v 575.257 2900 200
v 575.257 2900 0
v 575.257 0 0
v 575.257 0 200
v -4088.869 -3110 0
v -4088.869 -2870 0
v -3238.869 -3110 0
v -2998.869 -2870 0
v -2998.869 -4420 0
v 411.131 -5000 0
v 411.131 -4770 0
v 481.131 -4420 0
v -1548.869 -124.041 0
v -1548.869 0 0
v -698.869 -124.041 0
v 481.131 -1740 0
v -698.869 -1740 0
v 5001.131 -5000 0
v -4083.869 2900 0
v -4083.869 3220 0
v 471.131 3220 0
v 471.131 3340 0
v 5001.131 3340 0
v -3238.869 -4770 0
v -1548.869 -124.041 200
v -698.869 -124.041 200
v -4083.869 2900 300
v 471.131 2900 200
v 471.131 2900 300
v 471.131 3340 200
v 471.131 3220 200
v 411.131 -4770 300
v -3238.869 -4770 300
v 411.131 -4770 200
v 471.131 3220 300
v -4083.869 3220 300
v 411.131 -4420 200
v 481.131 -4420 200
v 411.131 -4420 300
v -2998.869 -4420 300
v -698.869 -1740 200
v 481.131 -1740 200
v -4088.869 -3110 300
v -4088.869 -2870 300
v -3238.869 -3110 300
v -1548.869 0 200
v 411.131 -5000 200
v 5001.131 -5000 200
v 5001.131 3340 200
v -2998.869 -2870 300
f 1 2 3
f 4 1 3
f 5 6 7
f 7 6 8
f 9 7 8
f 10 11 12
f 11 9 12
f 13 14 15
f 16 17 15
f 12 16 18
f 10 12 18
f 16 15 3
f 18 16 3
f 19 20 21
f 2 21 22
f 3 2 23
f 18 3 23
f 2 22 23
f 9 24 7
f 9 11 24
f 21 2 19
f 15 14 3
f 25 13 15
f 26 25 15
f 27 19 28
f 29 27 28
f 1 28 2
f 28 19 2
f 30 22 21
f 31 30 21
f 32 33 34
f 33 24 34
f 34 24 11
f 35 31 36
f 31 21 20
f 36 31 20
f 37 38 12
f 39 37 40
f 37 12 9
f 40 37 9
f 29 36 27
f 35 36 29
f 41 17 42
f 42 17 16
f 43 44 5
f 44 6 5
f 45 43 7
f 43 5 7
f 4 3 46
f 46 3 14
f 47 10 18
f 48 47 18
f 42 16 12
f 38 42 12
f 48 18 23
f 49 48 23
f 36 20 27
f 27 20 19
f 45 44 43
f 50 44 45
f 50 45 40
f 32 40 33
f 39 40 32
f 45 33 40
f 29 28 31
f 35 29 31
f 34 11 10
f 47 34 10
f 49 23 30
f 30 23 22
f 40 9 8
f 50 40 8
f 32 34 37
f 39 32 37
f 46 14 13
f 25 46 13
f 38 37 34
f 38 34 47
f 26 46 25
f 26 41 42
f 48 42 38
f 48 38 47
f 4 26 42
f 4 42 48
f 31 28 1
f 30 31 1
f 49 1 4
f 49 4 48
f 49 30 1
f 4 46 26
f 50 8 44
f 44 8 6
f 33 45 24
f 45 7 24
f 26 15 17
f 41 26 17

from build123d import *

# Parameters (mm, degrees)
F1_DEPTH = 200
F2_W     = 4555
F2_H     = 320
F3_DEPTH = 100


with BuildPart() as f1:
    # F0 (on Top) → F1 (new body)
    with BuildSketch(Plane.XY):
        Polygon((-4088.868618, -2870), (-4088.868618, -3110), (-3238.868618, -3110), (-3238.868618, -4770), (411.131382, -4770), (411.131382, -5000), (5001.131382, -5000), (5001.131382, 3340), (575.25748, 3340), (471.13148, 3340), (471.13148, 3220), (-4083.86852, 3220), (-4083.86852, 2900), (575.25748, 2900), (575.25748, 0), (-1548.868618, 0), (-1548.868618, -124.041), (-698.868618, -124.041), (-698.868618, -1740), (481.131382, -1740), (481.131382, -4420), (-2998.868618, -4420), (-2998.868618, -2870), align=None)
    extrude(amount=F1_DEPTH)

    # F2 (on face) → F3 (join)
    with BuildSketch(Plane.XY.offset(200)):
        Polygon((-2998.868618, -2870), (-4088.868618, -2870), (-4088.868618, -3110), (-3238.868618, -3110), (-3238.868618, -4770), (411.131382, -4770), (411.131382, -4420), (-2998.868618, -4420), align=None)
        with Locations((-1806.36852, 3060)):
            Rectangle(F2_W, F2_H)
    extrude(amount=F3_DEPTH)


solid = f1.part
